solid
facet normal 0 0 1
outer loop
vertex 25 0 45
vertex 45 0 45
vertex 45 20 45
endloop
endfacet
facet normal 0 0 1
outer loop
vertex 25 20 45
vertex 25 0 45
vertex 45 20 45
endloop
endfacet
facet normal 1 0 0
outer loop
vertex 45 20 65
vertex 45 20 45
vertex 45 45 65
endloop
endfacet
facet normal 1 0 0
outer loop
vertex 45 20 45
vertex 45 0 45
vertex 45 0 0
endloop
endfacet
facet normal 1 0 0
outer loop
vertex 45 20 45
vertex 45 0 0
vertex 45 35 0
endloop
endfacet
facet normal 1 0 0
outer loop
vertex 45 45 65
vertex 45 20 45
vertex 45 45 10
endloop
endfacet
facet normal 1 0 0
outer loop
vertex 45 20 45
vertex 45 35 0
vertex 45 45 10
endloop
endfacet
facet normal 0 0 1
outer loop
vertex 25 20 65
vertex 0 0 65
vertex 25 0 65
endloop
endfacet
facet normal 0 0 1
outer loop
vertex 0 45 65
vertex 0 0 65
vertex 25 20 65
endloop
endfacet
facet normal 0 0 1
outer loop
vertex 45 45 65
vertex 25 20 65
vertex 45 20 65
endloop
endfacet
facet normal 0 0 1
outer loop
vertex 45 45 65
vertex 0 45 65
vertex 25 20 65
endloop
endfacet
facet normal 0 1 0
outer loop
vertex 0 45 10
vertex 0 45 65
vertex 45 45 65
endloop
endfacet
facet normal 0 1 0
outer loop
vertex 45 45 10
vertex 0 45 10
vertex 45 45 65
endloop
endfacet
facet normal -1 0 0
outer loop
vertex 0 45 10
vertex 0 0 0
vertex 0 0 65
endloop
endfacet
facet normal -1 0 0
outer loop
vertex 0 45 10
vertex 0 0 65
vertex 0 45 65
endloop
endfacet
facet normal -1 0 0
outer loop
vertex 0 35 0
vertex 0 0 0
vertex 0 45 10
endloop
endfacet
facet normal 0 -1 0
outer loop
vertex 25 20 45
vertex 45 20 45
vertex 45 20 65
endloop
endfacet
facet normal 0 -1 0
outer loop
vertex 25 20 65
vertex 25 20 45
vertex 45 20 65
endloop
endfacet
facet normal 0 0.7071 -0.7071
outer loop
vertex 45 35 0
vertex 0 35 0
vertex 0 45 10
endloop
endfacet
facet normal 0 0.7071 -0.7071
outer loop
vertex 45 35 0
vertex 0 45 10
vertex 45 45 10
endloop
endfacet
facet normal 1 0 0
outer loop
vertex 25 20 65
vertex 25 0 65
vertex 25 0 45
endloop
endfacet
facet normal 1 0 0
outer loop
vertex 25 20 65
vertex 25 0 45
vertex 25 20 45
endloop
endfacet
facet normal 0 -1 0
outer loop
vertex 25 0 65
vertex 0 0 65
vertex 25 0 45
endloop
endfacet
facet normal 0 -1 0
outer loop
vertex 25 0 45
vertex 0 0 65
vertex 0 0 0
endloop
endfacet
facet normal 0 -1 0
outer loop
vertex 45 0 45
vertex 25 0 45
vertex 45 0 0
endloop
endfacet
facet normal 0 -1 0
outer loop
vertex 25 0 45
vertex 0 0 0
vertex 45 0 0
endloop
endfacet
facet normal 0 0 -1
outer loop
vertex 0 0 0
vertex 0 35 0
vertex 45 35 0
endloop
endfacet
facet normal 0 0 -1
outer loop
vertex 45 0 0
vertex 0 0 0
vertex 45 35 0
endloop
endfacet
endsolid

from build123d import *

# Parameters (mm, degrees)
F0_W     = 45
F0_H     = 45
F1_DEPTH = 65
F2_W     = 20
F2_H     = 20
F3_DEPTH = 20
F4_SIZE  = 10


with BuildPart() as f1:
    # F0 (on Top) → F1 (new body)
    with BuildSketch(Plane.XY):
        with Locations((22.5, 22.5)):
            Rectangle(F0_W, F0_H)
    extrude(amount=F1_DEPTH)

    # F2 (on face) → F3 (cut)
    with BuildSketch(Plane.YZ.offset(45)):
        with Locations((10, 55)):
            Rectangle(F2_W, F2_H)
    extrude(amount=-F3_DEPTH, mode=Mode.SUBTRACT)

    # F4
    f4_edges = [f1.edges().sort_by_distance(p)[0] for p in [
        (22.5, 45, 0),
    ]]
    chamfer(f4_edges, length=F4_SIZE)


solid = f1.part
